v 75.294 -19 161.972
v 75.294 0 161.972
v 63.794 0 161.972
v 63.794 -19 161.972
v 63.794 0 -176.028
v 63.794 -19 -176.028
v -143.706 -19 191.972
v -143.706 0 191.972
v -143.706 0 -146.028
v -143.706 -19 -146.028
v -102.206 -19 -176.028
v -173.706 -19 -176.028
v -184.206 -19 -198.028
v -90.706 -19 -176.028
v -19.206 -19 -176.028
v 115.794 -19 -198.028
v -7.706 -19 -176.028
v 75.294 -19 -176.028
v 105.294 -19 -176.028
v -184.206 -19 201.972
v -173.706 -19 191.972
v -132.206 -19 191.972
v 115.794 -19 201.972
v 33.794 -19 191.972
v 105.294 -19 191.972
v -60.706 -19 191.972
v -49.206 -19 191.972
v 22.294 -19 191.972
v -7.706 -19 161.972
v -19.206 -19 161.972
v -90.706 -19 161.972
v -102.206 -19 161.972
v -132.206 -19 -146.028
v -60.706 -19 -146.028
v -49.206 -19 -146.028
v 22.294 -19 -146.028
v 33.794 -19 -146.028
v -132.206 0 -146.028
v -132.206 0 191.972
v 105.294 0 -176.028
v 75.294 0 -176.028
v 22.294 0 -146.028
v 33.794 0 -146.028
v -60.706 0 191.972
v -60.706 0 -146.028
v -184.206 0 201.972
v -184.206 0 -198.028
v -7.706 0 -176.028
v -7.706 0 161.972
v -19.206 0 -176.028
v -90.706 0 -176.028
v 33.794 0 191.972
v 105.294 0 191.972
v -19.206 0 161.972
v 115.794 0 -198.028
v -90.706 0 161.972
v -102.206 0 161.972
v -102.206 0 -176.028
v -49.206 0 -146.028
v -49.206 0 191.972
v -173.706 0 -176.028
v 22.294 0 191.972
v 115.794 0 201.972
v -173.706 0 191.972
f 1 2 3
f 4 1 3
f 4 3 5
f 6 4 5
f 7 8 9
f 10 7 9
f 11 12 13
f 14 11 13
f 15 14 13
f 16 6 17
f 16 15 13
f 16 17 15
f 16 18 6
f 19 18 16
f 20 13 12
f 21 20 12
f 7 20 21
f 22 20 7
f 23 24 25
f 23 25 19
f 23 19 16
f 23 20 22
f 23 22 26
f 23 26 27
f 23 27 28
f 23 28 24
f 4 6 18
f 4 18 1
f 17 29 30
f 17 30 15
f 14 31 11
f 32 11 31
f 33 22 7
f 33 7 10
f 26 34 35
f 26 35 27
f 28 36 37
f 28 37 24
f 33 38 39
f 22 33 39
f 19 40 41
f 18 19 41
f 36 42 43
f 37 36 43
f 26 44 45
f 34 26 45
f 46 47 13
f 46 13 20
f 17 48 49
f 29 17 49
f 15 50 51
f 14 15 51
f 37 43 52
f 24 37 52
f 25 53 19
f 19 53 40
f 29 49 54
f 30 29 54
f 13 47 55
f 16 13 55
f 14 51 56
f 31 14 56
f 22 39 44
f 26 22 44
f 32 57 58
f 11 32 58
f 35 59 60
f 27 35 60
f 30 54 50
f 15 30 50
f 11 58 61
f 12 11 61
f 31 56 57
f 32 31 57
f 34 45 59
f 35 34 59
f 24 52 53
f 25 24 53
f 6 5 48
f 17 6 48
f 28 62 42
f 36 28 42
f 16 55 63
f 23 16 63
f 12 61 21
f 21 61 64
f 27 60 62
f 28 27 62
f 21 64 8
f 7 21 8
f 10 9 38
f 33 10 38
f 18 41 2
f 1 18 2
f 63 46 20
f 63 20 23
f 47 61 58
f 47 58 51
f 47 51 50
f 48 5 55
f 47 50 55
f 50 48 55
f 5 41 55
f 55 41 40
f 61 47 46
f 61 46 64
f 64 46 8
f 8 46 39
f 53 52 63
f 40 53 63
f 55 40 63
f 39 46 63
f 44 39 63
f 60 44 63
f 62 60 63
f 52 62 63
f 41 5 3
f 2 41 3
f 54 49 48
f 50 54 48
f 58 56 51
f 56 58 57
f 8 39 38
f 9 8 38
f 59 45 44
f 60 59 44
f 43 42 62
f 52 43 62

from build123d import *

# Parameters (mm, degrees)
F0_W     = 300
F0_H     = 400
F1_DEPTH = 19
F3_DEPTH = 19


with BuildPart() as f1:
    # F0 (on Front) → F1 (new body)
    with BuildSketch(Plane.XZ):
        with Locations((-34.205507, 1.972216)):
            Rectangle(F0_W, F0_H)
    extrude(amount=F1_DEPTH)

    # F2 (on face) → F3 (cut)
    with BuildSketch(Plane(origin=(0, 0, 0), x_dir=(-1, 0, 0), z_dir=(0, 1, 0))):
        Polygon((-105.294493, 191.972216), (-105.294493, -176.027784), (-75.294493, -176.027784), (-75.294493, 161.972216), (-63.794493, 161.972216), (-63.794493, -176.027784), (7.705507, -176.027784), (7.705507, 161.972216), (19.205507, 161.972216), (19.205507, -176.027784), (90.705507, -176.027784), (90.705507, 161.972216), (102.205507, 161.972216), (102.205507, -176.027784), (173.705507, -176.027784), (173.705507, 191.972216), (143.705507, 191.972216), (143.705507, -146.027784), (132.205507, -146.027784), (132.205507, 191.972216), (60.705507, 191.972216), (60.705507, -146.027784), (49.205507, -146.027784), (49.205507, 191.972216), (-22.294493, 191.972216), (-22.294493, -146.027784), (-33.794493, -146.027784), (-33.794493, 191.972216), align=None)
    extrude(amount=-F3_DEPTH, mode=Mode.SUBTRACT)


solid = f1.part
